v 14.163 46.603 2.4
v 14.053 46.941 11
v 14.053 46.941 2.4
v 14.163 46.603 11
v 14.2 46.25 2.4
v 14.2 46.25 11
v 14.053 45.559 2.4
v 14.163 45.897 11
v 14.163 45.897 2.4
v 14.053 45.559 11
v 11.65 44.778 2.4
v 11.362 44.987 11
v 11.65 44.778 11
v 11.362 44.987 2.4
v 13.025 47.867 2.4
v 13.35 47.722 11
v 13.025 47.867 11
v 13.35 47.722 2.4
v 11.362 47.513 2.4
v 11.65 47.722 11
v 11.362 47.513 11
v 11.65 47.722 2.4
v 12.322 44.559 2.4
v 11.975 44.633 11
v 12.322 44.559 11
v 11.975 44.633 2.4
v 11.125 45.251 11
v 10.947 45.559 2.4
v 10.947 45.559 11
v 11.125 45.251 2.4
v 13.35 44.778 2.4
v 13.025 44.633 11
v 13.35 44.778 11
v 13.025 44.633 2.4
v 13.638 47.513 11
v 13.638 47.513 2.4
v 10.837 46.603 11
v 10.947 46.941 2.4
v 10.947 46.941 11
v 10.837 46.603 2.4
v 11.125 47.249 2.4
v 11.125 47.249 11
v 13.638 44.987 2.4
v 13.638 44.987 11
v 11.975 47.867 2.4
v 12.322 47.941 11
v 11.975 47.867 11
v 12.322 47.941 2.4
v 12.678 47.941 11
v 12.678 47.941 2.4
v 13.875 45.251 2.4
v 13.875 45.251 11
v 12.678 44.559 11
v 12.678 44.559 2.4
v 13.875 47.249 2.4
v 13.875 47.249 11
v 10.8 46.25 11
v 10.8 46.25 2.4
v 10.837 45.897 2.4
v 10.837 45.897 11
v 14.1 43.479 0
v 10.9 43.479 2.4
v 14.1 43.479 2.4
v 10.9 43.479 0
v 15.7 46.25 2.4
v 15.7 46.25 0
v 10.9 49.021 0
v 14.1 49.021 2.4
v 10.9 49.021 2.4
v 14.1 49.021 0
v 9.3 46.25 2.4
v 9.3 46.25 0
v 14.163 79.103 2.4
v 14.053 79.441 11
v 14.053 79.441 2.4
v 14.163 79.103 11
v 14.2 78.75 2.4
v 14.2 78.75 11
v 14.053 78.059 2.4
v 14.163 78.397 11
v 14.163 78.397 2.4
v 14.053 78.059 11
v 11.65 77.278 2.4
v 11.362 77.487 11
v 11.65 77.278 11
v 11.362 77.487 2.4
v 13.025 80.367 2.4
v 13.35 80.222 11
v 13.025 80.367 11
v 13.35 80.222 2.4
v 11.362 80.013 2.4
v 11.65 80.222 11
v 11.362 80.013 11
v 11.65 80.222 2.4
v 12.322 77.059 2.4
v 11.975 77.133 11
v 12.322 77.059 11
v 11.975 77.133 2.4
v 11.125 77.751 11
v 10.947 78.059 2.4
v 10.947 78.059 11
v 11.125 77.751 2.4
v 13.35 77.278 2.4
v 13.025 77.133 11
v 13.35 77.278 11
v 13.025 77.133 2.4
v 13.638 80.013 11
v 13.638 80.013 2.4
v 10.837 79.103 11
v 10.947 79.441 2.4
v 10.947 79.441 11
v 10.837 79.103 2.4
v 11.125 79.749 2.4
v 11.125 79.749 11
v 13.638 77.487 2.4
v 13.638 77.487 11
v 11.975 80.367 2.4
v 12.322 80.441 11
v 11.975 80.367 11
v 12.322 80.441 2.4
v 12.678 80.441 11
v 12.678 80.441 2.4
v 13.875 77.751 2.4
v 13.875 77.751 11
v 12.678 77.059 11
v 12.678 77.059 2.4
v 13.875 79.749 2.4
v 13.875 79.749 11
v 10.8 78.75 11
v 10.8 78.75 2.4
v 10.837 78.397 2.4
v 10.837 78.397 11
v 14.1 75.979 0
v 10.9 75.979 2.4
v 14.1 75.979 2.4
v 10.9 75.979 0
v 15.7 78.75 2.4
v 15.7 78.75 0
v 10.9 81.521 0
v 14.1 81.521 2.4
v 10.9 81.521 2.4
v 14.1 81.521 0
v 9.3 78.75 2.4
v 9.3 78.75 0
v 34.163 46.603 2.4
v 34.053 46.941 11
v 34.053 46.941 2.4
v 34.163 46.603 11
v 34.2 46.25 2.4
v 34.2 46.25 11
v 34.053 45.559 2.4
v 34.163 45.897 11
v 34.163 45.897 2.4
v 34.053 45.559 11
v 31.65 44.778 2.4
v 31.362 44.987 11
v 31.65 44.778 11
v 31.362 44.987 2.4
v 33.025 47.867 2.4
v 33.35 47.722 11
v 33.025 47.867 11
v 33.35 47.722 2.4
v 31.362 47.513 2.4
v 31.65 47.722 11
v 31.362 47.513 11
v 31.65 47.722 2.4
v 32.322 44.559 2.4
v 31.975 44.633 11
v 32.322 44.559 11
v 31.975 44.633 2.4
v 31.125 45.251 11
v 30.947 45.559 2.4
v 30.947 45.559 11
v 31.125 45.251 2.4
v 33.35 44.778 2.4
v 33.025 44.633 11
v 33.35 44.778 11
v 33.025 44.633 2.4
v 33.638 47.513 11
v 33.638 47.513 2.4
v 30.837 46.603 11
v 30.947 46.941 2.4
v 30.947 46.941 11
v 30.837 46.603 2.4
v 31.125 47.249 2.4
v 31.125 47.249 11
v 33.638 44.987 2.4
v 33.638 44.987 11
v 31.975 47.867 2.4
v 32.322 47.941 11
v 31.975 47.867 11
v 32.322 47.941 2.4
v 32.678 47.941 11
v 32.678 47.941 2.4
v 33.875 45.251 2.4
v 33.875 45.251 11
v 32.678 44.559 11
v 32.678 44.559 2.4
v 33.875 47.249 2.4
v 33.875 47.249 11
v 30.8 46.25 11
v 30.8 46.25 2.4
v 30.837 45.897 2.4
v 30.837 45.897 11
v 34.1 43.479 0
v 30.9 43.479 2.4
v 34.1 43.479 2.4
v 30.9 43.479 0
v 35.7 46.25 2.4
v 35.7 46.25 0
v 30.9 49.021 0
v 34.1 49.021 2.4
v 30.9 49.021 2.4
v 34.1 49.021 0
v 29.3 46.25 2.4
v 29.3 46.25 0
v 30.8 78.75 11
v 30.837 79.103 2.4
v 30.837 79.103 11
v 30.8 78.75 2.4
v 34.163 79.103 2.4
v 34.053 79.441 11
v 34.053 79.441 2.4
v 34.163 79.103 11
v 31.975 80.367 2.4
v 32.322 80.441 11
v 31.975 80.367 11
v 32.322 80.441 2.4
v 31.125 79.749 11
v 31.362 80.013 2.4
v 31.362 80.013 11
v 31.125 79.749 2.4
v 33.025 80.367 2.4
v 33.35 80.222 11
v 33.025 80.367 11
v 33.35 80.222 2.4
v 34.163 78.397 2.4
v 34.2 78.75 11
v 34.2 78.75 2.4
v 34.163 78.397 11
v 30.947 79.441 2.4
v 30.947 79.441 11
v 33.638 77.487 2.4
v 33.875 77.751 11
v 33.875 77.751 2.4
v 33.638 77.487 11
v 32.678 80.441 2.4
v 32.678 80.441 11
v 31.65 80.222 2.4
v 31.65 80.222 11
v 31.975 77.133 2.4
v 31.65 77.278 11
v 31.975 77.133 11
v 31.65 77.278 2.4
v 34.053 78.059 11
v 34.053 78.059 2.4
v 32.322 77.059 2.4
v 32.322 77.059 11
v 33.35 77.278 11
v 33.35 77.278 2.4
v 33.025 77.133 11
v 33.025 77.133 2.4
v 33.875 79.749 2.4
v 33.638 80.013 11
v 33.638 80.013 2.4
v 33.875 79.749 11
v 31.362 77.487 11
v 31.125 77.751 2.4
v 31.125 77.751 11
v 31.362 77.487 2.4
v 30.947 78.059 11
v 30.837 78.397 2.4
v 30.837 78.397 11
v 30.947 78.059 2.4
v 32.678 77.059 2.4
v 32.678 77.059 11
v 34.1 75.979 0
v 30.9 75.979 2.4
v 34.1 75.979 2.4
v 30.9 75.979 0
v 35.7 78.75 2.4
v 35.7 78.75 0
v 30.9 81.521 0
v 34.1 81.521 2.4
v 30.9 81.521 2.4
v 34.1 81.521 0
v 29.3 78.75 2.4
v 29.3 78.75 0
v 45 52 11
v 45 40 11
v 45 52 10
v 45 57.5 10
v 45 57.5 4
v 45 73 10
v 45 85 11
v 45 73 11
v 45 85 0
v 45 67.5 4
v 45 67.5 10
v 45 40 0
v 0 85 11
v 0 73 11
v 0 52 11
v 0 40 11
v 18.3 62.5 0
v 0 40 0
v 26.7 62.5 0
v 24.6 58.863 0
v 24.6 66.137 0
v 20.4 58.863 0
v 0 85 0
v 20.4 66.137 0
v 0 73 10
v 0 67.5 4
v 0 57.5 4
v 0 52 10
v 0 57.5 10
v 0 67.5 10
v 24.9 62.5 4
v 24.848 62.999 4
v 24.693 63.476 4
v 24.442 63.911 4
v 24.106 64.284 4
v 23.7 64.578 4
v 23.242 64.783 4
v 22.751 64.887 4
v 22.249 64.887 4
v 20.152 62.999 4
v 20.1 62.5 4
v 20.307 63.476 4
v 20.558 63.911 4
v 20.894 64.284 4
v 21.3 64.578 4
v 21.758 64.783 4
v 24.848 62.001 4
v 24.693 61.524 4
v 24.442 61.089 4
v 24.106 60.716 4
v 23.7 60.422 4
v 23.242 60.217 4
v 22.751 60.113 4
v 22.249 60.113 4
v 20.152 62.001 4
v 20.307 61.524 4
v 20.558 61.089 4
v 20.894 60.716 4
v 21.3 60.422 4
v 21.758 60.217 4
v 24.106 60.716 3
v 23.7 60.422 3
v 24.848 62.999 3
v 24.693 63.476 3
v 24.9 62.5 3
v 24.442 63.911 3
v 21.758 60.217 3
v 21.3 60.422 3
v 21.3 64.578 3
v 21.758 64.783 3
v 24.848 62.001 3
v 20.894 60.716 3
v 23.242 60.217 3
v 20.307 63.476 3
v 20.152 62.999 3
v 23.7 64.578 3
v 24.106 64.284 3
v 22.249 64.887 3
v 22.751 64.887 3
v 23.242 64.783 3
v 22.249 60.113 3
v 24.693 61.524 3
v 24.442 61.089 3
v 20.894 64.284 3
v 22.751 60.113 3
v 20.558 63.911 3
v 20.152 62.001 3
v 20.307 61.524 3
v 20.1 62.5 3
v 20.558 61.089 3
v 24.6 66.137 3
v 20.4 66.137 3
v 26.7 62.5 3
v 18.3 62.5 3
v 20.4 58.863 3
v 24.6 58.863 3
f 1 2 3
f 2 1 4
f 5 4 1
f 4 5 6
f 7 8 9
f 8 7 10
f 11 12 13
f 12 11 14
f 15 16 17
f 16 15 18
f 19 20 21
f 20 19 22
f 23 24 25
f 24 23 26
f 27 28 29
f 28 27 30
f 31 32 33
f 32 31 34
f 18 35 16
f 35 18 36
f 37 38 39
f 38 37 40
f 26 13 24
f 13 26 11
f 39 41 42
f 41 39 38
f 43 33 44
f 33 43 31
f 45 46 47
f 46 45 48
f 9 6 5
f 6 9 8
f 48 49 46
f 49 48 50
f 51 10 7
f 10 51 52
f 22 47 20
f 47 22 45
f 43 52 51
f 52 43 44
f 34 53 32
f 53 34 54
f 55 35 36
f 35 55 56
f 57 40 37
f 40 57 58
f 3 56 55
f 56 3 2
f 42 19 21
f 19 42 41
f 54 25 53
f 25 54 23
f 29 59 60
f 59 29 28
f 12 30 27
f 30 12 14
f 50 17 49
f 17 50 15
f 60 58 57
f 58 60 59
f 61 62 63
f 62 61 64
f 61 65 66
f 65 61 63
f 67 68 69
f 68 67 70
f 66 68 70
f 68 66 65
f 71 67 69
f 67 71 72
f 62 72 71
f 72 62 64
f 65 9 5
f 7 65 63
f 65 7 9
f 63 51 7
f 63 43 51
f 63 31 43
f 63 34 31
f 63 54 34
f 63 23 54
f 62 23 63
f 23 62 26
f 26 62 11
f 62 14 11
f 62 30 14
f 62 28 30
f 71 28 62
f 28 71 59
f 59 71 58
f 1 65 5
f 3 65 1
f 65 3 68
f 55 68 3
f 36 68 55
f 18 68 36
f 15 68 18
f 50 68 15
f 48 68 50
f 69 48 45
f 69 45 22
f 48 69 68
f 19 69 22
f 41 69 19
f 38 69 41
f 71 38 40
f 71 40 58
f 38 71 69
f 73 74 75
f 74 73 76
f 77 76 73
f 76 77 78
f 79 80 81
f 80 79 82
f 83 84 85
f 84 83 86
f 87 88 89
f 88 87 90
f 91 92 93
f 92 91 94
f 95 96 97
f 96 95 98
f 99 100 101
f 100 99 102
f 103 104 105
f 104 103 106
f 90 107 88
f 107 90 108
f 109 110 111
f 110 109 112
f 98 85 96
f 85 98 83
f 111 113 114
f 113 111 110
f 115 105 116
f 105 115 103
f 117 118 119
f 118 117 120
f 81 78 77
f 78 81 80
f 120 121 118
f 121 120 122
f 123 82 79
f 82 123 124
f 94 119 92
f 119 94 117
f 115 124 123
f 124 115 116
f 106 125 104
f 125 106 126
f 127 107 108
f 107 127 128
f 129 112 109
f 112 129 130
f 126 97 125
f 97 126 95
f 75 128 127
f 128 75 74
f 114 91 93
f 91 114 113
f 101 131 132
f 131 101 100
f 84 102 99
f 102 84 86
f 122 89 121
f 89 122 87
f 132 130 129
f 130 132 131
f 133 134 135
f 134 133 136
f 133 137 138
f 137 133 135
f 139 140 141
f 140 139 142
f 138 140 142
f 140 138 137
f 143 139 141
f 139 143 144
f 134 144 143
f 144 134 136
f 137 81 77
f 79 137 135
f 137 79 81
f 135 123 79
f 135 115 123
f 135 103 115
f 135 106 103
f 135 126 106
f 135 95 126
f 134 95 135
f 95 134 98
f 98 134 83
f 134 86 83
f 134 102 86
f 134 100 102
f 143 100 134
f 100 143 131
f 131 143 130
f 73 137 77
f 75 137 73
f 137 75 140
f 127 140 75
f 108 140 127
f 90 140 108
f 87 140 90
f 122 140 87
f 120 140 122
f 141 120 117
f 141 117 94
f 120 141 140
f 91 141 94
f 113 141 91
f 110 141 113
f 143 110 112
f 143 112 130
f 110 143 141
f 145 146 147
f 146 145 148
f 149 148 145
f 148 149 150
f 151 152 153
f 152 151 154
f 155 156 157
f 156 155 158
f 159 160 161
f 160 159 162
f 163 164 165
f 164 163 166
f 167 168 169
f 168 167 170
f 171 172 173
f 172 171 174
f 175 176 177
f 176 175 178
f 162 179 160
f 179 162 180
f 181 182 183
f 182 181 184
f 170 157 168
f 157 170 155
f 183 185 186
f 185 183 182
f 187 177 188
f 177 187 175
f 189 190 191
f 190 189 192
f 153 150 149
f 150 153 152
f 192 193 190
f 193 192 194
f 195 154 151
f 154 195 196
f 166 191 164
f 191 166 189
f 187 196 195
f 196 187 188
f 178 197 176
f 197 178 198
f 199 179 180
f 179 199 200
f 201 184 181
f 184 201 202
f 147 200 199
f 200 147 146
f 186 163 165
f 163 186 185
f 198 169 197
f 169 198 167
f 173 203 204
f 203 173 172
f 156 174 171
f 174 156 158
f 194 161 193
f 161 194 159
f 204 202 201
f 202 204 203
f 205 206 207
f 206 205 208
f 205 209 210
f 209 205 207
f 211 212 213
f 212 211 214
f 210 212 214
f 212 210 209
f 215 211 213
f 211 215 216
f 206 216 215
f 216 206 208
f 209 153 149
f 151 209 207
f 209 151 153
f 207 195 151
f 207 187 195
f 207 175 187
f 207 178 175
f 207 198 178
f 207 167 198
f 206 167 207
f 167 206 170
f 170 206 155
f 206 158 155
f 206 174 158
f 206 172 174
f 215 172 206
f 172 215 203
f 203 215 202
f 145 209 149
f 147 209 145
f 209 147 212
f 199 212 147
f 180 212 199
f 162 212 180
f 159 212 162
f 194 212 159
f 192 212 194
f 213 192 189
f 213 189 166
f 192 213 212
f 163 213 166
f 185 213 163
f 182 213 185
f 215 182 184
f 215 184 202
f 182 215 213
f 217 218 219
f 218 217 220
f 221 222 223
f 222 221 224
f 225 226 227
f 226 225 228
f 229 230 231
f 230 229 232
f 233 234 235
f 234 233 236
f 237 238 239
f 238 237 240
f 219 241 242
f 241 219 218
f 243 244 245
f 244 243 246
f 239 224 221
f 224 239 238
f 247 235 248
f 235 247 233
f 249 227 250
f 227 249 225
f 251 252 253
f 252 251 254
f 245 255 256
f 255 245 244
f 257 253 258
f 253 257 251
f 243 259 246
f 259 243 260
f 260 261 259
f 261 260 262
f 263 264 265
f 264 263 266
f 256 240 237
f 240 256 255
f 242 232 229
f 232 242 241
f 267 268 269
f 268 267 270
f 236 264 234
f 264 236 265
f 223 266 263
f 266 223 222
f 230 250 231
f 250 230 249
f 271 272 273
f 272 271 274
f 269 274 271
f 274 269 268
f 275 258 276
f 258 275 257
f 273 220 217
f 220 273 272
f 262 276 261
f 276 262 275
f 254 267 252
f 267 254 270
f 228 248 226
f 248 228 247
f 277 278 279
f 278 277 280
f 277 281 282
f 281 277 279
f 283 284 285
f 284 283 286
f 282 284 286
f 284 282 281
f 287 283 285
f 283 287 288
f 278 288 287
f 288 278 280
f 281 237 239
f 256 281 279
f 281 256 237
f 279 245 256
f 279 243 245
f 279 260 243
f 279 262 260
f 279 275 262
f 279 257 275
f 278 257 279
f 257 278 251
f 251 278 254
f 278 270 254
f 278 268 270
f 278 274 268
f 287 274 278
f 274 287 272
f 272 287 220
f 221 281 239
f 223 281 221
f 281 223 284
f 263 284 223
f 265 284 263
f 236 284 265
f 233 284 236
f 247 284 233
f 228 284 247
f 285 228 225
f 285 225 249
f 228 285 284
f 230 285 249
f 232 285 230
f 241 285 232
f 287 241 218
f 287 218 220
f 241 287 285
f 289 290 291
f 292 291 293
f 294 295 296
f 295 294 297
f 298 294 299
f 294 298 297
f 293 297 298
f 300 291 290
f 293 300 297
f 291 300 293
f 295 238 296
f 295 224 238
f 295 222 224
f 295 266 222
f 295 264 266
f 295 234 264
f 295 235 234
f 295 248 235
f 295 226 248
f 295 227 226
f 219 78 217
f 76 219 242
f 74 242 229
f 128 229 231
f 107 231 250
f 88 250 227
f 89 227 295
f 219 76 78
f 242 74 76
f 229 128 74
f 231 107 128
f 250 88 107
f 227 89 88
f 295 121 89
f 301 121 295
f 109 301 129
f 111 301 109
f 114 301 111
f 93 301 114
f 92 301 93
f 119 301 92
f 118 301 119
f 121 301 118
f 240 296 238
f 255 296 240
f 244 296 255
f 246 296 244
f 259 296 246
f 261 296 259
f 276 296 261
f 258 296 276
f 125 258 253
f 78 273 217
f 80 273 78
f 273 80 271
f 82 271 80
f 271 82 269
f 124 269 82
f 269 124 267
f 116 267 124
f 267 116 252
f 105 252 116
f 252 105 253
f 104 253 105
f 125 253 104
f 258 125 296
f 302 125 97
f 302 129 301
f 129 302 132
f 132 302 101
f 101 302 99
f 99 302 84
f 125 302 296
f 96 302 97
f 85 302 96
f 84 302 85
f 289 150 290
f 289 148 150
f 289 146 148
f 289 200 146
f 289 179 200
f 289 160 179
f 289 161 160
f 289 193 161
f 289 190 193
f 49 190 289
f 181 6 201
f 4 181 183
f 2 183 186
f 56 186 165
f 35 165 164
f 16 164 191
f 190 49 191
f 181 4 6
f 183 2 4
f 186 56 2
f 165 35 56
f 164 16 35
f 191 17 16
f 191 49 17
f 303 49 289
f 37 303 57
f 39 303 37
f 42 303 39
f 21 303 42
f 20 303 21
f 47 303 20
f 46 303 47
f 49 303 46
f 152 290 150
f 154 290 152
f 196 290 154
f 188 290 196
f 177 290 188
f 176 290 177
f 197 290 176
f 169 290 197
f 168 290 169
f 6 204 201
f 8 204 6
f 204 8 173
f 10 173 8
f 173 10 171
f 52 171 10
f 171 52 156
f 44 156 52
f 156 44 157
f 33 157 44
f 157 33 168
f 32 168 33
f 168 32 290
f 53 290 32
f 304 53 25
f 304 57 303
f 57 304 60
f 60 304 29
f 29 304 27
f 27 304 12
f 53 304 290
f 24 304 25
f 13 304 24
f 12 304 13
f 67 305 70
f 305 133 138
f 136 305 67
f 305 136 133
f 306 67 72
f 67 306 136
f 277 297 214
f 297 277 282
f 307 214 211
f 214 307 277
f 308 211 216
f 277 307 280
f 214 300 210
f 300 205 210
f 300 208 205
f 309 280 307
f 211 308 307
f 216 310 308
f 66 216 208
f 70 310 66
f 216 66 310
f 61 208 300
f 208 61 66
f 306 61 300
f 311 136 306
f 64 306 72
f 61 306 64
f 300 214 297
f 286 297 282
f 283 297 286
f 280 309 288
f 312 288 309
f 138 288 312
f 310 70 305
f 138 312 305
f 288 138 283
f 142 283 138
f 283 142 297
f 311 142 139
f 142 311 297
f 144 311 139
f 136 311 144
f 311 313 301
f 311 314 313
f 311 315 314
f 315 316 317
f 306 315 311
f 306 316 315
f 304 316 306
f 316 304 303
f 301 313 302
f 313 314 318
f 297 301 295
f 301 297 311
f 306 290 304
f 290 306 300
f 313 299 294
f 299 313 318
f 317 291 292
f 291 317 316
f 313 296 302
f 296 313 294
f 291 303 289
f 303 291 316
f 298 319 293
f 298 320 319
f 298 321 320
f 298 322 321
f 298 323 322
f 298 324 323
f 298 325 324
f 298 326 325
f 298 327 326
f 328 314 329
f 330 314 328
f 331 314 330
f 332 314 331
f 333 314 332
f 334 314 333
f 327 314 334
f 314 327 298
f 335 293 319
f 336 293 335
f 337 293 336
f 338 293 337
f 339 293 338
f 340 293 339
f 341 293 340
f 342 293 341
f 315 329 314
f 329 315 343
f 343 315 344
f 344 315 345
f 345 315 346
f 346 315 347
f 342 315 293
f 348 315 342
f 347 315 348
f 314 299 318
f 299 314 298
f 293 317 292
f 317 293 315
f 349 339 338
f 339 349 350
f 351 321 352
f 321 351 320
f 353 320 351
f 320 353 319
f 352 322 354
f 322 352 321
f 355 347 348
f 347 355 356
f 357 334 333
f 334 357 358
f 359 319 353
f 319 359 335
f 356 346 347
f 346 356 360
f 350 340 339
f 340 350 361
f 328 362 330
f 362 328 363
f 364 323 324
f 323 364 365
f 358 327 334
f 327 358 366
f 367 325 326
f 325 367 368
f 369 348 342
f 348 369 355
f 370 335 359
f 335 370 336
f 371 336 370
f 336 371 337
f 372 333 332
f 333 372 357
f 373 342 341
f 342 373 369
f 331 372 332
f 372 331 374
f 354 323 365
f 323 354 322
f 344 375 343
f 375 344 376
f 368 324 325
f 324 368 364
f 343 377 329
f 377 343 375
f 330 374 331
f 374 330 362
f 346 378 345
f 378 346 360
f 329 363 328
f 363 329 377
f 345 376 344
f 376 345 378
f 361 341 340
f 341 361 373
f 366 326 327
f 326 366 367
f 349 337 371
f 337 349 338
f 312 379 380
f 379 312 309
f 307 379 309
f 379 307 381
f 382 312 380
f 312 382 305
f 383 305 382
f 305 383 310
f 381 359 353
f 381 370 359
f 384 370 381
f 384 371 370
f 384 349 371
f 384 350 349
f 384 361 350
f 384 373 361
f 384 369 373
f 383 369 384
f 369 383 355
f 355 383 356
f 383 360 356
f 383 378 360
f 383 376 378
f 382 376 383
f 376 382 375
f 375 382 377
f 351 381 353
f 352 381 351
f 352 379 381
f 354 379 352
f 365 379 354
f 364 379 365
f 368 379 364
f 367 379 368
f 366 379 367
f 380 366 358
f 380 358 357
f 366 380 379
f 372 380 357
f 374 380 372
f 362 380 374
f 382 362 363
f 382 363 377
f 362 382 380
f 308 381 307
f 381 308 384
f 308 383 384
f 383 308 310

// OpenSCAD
// W = L = 45
// 45 - 20 = 25; 25 / 2 = 12.5
// B = 32
// 45 - 32 = 13; 13 / 2 = 6.5
// C = 30
// 45 - 30 = 15; 15 / 2 = 7.5

//bracket();
translate([0, 40, 0]) sled();

module bracket() {
	difference() {
		cube([140, 12.5, 14]);
		// M5 slider
		for(i=[7.5, 7.5+30, 140-7.5-30, 140-7.5]) {
			translate([i, 6.5, -0.1]) cylinder(r=2.5+0.4, h=21, $fn=60);
			translate([i, 6.5, 10]) cylinder(r=5+0.4, h=21, $fn=60);
		}
		// M3 connector
		for(i=[17.5, 52.5, 87.5, 122.5]) {
			translate([i, -0.1, 9]) rotate([-90, 0, 0]) cylinder(r=1.5+0.2, h=20, $fn=30);
			translate([i, -0.1, 9]) rotate([-90, 0, 0]) cylinder(r=3+0.4, h=3.6, $fn=30);
		}
		// Sled connectors
		for(i = [60, 80]) {
			translate([i, 6.25, -0.01]) cylinder(r=1.5+0.2, h=20, $fn=30);
			translate([i, 6.25, 10.5]) cylinder(r=3+0.4, h=20, $fn=30);
		}
	}
}

module sled() {
	difference() {
		cube([45, 45, 11]);
		// GT2 attach
		translate([-0.1, 12, 10]) cube([50.2, 21, 8]);
		translate([-0.1, 17.5, 4]) cube([50.2, 10, 12]);
		translate([22.5, 22.5, -0.1]) cylinder(r=2+0.4, h=10, $fn=30);
		translate([22.5, 22.5, -0.1]) cylinder(r=4+0.2, h=3.1, $fn=6);
		// Attach main
		for(i = [15, 35]) {
			for(j = [6.25, 45-6.25]) {
				translate([i-2.5, j, -0.1]) {
					cylinder(r=1.5+0.2, h=20, $fn=30);
					cylinder(r=3+0.2, h=2.5, $fn=6);
				}
			}
		}
	}
}
